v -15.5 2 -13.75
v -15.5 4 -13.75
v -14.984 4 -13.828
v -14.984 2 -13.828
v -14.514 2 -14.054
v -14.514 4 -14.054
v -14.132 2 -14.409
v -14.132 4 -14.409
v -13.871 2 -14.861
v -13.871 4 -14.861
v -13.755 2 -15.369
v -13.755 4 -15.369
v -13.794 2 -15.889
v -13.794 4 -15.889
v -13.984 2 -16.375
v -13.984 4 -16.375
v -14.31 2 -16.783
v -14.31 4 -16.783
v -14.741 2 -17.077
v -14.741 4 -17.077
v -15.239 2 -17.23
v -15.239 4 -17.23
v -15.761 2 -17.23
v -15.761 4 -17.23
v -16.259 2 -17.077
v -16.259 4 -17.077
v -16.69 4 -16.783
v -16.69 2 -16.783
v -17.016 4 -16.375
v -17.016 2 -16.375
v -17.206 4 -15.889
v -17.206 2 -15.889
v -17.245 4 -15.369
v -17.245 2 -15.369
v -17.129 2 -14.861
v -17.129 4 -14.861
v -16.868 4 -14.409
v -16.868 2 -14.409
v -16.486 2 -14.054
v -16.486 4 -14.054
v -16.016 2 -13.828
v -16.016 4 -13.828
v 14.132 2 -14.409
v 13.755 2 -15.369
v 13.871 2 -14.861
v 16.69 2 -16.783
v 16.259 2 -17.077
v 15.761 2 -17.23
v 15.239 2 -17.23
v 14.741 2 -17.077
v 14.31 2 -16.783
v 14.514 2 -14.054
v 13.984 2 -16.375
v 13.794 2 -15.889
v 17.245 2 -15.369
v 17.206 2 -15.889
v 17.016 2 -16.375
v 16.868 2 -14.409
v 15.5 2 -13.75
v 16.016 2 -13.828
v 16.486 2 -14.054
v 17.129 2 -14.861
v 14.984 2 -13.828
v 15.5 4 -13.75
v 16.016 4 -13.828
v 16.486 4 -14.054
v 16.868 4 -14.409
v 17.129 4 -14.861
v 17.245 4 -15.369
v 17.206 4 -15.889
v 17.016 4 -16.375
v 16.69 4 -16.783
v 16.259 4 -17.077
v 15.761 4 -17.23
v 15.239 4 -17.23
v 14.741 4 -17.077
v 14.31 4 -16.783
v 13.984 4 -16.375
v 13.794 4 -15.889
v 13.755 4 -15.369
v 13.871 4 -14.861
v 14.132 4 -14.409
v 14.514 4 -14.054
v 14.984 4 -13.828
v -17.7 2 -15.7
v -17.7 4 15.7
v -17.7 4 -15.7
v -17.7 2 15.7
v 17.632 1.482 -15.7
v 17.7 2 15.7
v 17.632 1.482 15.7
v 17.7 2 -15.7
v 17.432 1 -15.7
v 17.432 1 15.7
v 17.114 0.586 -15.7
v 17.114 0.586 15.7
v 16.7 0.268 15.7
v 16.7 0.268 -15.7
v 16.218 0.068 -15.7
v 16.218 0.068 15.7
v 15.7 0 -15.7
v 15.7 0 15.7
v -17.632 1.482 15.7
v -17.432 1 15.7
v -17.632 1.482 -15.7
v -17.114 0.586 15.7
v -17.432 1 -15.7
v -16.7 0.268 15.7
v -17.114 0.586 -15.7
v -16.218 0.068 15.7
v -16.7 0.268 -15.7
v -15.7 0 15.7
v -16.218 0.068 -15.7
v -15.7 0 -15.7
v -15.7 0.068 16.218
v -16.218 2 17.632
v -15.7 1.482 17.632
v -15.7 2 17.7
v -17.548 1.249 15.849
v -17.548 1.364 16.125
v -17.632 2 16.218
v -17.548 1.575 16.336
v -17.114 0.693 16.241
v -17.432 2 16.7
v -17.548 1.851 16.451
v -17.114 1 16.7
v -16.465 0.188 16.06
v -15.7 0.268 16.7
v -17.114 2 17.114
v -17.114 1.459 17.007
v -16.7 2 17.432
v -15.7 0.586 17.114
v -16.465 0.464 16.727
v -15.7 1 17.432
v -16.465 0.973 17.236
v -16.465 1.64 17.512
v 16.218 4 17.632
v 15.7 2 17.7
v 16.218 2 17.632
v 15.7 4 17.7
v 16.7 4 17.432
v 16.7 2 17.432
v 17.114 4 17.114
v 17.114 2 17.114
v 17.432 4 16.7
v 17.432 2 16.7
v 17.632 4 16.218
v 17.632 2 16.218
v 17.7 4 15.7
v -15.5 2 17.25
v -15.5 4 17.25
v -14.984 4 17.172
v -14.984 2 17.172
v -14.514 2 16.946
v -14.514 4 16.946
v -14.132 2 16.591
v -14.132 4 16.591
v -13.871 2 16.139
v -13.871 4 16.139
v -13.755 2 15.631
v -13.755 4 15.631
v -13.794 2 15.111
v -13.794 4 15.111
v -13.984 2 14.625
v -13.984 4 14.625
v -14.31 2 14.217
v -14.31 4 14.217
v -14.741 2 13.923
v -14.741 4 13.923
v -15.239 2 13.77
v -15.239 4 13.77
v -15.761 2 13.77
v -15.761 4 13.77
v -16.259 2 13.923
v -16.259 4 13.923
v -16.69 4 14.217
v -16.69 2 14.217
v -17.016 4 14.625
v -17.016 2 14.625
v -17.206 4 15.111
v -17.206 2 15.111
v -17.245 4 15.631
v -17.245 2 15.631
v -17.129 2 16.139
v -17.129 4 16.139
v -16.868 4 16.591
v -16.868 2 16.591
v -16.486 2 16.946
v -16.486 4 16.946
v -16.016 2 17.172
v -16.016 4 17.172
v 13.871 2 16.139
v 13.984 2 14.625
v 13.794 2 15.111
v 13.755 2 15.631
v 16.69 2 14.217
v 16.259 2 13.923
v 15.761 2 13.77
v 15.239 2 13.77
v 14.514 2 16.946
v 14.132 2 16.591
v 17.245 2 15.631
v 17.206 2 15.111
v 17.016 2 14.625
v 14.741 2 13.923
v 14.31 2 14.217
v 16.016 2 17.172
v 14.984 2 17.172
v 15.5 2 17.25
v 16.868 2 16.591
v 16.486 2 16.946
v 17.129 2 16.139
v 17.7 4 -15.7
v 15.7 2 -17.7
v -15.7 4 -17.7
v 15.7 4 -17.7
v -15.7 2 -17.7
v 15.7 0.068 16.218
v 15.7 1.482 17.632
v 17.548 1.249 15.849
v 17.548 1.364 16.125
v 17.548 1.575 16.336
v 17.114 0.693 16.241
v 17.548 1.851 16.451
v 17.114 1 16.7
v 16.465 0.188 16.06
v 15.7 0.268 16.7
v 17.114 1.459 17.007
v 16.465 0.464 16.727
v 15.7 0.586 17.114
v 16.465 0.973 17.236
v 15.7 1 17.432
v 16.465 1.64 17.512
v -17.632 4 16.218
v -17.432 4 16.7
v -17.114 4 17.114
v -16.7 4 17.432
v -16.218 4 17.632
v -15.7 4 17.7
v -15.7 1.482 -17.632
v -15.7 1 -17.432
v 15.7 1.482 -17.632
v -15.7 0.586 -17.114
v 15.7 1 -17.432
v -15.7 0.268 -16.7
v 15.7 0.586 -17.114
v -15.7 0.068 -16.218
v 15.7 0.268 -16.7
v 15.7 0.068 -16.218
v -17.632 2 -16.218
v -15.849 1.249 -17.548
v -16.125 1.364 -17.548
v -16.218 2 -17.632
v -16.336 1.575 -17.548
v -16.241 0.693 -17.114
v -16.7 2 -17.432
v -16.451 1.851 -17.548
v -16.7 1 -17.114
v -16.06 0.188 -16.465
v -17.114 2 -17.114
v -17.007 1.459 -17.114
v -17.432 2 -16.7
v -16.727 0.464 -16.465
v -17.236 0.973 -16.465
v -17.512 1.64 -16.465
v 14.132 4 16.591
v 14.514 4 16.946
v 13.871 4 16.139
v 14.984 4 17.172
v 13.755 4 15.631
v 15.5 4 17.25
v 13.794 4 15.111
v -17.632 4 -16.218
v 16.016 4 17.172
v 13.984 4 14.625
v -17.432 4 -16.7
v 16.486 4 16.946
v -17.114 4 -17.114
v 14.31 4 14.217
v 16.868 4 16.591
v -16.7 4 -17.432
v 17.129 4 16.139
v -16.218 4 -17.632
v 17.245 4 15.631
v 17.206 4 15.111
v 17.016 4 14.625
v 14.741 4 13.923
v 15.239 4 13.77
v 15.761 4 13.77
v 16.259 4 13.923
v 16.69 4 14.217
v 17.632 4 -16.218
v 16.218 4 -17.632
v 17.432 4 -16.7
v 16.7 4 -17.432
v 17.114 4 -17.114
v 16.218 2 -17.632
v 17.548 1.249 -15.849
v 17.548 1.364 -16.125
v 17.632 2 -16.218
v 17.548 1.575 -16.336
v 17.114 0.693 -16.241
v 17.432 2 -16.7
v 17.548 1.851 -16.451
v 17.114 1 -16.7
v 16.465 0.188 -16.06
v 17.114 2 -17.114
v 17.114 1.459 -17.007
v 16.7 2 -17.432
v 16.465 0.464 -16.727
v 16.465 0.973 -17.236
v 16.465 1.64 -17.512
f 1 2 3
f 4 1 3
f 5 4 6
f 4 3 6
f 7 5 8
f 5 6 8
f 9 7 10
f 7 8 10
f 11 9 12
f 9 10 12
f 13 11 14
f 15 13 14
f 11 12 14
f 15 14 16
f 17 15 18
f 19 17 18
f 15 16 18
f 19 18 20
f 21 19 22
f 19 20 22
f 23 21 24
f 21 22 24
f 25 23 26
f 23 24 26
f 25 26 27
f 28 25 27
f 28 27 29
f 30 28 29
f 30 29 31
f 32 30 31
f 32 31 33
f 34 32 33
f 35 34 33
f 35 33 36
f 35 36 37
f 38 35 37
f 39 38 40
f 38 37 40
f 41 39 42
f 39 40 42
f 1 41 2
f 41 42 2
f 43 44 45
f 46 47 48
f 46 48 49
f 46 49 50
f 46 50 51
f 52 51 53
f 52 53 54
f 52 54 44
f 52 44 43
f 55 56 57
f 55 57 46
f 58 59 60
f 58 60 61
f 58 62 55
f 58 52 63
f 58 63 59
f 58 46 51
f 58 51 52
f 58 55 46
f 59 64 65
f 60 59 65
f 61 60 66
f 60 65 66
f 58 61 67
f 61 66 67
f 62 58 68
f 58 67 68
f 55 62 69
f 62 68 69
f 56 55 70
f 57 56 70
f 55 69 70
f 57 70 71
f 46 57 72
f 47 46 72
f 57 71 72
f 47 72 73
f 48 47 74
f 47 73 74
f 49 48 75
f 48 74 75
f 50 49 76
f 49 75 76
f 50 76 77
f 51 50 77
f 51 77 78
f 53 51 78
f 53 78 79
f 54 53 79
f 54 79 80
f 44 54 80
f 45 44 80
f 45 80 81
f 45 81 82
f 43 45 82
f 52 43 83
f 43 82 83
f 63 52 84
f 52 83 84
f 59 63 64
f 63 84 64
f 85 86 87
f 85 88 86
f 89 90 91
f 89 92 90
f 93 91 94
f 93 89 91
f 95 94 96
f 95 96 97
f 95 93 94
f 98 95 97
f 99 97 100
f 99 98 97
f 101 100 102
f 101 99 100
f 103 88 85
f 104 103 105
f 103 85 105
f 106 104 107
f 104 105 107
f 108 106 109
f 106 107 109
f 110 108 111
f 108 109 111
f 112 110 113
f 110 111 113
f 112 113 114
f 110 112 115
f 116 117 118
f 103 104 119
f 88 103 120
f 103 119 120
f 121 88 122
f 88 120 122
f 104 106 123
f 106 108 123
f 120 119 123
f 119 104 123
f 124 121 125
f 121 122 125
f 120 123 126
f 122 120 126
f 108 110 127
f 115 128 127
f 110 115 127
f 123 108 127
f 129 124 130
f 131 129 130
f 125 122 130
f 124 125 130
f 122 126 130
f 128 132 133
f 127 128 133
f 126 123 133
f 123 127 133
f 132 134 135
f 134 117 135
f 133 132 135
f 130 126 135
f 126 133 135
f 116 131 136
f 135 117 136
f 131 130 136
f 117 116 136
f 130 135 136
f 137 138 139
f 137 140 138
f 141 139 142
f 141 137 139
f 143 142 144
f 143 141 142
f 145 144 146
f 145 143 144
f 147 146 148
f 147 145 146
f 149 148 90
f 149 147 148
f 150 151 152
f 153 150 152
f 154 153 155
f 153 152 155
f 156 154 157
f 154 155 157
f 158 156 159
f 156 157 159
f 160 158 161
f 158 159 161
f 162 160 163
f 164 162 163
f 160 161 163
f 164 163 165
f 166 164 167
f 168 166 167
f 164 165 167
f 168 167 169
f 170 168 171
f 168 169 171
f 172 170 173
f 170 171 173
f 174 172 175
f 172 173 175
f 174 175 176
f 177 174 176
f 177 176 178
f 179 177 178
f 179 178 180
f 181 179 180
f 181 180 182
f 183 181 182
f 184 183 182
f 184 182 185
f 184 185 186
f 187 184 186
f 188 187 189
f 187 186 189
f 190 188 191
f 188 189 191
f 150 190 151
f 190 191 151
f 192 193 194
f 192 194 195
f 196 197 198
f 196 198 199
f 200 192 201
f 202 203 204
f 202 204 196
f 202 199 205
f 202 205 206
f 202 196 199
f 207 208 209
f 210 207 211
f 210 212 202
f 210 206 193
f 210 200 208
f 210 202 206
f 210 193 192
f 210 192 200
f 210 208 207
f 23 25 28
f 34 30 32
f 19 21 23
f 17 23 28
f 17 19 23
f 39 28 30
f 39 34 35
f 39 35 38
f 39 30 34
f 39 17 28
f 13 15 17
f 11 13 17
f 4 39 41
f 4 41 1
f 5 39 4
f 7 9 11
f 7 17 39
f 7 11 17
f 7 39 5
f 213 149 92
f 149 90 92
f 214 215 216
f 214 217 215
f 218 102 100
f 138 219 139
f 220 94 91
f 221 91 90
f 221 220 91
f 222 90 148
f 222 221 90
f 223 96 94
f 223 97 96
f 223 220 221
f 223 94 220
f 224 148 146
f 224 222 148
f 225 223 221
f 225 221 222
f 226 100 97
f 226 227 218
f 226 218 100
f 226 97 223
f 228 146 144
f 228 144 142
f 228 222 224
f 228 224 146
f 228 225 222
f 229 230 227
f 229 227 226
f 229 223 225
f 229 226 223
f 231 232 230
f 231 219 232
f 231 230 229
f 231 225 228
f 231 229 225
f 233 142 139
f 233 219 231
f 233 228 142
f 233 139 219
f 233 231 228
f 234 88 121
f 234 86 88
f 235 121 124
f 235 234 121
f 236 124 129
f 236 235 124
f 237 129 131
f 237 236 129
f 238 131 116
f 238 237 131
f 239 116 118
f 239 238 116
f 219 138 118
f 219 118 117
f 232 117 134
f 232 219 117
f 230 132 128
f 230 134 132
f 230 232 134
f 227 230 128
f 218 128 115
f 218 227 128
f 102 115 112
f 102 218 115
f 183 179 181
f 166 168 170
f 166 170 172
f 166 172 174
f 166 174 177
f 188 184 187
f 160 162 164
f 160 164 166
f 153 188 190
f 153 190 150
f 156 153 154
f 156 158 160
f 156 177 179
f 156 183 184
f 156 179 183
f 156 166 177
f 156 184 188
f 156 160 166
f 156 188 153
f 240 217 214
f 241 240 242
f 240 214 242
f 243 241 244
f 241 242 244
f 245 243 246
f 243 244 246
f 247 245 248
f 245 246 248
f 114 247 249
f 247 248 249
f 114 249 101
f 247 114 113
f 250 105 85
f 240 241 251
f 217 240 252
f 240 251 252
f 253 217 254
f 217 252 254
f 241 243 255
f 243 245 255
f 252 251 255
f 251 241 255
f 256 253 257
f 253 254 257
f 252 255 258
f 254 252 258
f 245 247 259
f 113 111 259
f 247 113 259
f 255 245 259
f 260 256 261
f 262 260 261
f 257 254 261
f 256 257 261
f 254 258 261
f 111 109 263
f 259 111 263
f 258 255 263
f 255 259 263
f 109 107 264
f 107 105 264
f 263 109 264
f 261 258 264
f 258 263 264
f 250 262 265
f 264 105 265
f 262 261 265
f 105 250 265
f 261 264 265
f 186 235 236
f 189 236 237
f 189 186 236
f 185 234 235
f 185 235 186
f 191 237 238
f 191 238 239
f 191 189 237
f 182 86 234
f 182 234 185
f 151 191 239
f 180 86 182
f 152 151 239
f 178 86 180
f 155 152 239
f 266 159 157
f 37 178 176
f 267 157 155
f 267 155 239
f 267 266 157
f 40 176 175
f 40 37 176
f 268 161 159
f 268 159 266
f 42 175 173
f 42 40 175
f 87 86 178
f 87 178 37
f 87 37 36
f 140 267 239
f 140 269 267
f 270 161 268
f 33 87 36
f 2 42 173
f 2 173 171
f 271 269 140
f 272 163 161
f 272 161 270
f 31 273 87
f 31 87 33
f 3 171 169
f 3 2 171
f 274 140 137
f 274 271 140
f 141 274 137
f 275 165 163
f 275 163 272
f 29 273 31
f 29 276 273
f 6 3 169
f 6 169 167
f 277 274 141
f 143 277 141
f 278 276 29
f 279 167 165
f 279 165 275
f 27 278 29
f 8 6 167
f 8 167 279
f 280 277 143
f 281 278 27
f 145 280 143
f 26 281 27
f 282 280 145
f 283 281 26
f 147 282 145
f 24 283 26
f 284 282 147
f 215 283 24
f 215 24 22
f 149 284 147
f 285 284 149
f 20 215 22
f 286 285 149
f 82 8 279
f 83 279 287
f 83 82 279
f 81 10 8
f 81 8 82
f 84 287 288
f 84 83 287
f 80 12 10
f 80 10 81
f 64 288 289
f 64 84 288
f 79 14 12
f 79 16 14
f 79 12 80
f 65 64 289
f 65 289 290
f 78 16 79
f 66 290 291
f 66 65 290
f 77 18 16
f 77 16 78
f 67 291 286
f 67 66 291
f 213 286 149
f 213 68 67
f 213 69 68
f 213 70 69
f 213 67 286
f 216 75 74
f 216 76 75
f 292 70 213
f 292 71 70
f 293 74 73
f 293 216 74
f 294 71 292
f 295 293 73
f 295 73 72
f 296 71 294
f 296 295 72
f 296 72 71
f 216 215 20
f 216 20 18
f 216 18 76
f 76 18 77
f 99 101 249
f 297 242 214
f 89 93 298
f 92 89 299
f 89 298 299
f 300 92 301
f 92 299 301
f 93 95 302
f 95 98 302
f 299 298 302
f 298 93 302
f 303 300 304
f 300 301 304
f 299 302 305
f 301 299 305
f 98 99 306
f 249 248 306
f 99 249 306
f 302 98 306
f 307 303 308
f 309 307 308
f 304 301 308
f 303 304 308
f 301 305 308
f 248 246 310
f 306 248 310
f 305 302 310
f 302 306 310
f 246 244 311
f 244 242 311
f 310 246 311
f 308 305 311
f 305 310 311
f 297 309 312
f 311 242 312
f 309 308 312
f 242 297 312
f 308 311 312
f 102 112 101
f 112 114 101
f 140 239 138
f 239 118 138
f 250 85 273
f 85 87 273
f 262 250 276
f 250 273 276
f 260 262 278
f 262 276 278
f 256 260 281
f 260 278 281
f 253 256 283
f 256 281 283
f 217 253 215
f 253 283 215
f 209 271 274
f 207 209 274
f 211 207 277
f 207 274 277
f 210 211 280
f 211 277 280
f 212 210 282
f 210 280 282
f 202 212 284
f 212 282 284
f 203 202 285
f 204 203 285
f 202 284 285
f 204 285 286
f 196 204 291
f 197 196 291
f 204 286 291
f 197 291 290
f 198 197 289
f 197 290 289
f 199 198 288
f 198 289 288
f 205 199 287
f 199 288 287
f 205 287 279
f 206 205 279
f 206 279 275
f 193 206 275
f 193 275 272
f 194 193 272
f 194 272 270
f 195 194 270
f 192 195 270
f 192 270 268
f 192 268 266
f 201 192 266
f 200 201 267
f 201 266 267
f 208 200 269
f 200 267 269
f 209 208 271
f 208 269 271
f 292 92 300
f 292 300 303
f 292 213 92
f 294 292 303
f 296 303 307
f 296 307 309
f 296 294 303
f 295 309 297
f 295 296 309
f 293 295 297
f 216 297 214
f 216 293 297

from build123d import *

# Parameters (mm, degrees)
ESQUISSE1_W             = 35.4
ESQUISSE1_H             = 35.4
BOSS_EXTRU_1_DEPTH      = 4
CONG_1_R                = 2
ESQUISSE2_R             = 1.75
ENL_V_MAT_EXTRU_1_DEPTH = 2


with BuildPart() as part:
    # Esquisse1 → Boss.-Extru.1 (new body)
    with BuildSketch(Plane(origin=(0, 0, 0), x_dir=(1, 0, 0), z_dir=(0, 1, 0))):
        Rectangle(ESQUISSE1_W, ESQUISSE1_H)
    extrude(amount=BOSS_EXTRU_1_DEPTH)

    # Congé1
    cong_1_edges = [part.edges().sort_by_distance(p)[0] for p in [
        (0, 0, 17.7),
        (-17.7, 0, 0),
        (0, 0, -17.7),
        (17.7, 0, 0),
        (17.7, 2, 17.7),
        (-17.7, 2, 17.7),
        (-17.7, 2, -17.7),
        (17.7, 2, -17.7),
    ]]
    fillet(cong_1_edges, radius=CONG_1_R)

    # Esquisse2 → Enlèv. mat.-Extru.1 (cut)
    with BuildSketch(Plane(origin=(0, 4, 0), x_dir=(1, 0, 0), z_dir=(0, 1, 0))):
        with Locations(Location((-15.5, 15.5, 0), (0, 0, 270))):
            Circle(ESQUISSE2_R)
        with Locations(Location((15.5, 15.5, 0), (0, 0, 270))):
            Circle(ESQUISSE2_R)
        with Locations(Location((15.5, -15.5, 0), (0, 0, 270))):
            Circle(ESQUISSE2_R)
        with Locations(Location((-15.5, -15.5, 0), (0, 0, 270))):
            Circle(ESQUISSE2_R)
    extrude(amount=-ENL_V_MAT_EXTRU_1_DEPTH, mode=Mode.SUBTRACT)


solid = part.part
